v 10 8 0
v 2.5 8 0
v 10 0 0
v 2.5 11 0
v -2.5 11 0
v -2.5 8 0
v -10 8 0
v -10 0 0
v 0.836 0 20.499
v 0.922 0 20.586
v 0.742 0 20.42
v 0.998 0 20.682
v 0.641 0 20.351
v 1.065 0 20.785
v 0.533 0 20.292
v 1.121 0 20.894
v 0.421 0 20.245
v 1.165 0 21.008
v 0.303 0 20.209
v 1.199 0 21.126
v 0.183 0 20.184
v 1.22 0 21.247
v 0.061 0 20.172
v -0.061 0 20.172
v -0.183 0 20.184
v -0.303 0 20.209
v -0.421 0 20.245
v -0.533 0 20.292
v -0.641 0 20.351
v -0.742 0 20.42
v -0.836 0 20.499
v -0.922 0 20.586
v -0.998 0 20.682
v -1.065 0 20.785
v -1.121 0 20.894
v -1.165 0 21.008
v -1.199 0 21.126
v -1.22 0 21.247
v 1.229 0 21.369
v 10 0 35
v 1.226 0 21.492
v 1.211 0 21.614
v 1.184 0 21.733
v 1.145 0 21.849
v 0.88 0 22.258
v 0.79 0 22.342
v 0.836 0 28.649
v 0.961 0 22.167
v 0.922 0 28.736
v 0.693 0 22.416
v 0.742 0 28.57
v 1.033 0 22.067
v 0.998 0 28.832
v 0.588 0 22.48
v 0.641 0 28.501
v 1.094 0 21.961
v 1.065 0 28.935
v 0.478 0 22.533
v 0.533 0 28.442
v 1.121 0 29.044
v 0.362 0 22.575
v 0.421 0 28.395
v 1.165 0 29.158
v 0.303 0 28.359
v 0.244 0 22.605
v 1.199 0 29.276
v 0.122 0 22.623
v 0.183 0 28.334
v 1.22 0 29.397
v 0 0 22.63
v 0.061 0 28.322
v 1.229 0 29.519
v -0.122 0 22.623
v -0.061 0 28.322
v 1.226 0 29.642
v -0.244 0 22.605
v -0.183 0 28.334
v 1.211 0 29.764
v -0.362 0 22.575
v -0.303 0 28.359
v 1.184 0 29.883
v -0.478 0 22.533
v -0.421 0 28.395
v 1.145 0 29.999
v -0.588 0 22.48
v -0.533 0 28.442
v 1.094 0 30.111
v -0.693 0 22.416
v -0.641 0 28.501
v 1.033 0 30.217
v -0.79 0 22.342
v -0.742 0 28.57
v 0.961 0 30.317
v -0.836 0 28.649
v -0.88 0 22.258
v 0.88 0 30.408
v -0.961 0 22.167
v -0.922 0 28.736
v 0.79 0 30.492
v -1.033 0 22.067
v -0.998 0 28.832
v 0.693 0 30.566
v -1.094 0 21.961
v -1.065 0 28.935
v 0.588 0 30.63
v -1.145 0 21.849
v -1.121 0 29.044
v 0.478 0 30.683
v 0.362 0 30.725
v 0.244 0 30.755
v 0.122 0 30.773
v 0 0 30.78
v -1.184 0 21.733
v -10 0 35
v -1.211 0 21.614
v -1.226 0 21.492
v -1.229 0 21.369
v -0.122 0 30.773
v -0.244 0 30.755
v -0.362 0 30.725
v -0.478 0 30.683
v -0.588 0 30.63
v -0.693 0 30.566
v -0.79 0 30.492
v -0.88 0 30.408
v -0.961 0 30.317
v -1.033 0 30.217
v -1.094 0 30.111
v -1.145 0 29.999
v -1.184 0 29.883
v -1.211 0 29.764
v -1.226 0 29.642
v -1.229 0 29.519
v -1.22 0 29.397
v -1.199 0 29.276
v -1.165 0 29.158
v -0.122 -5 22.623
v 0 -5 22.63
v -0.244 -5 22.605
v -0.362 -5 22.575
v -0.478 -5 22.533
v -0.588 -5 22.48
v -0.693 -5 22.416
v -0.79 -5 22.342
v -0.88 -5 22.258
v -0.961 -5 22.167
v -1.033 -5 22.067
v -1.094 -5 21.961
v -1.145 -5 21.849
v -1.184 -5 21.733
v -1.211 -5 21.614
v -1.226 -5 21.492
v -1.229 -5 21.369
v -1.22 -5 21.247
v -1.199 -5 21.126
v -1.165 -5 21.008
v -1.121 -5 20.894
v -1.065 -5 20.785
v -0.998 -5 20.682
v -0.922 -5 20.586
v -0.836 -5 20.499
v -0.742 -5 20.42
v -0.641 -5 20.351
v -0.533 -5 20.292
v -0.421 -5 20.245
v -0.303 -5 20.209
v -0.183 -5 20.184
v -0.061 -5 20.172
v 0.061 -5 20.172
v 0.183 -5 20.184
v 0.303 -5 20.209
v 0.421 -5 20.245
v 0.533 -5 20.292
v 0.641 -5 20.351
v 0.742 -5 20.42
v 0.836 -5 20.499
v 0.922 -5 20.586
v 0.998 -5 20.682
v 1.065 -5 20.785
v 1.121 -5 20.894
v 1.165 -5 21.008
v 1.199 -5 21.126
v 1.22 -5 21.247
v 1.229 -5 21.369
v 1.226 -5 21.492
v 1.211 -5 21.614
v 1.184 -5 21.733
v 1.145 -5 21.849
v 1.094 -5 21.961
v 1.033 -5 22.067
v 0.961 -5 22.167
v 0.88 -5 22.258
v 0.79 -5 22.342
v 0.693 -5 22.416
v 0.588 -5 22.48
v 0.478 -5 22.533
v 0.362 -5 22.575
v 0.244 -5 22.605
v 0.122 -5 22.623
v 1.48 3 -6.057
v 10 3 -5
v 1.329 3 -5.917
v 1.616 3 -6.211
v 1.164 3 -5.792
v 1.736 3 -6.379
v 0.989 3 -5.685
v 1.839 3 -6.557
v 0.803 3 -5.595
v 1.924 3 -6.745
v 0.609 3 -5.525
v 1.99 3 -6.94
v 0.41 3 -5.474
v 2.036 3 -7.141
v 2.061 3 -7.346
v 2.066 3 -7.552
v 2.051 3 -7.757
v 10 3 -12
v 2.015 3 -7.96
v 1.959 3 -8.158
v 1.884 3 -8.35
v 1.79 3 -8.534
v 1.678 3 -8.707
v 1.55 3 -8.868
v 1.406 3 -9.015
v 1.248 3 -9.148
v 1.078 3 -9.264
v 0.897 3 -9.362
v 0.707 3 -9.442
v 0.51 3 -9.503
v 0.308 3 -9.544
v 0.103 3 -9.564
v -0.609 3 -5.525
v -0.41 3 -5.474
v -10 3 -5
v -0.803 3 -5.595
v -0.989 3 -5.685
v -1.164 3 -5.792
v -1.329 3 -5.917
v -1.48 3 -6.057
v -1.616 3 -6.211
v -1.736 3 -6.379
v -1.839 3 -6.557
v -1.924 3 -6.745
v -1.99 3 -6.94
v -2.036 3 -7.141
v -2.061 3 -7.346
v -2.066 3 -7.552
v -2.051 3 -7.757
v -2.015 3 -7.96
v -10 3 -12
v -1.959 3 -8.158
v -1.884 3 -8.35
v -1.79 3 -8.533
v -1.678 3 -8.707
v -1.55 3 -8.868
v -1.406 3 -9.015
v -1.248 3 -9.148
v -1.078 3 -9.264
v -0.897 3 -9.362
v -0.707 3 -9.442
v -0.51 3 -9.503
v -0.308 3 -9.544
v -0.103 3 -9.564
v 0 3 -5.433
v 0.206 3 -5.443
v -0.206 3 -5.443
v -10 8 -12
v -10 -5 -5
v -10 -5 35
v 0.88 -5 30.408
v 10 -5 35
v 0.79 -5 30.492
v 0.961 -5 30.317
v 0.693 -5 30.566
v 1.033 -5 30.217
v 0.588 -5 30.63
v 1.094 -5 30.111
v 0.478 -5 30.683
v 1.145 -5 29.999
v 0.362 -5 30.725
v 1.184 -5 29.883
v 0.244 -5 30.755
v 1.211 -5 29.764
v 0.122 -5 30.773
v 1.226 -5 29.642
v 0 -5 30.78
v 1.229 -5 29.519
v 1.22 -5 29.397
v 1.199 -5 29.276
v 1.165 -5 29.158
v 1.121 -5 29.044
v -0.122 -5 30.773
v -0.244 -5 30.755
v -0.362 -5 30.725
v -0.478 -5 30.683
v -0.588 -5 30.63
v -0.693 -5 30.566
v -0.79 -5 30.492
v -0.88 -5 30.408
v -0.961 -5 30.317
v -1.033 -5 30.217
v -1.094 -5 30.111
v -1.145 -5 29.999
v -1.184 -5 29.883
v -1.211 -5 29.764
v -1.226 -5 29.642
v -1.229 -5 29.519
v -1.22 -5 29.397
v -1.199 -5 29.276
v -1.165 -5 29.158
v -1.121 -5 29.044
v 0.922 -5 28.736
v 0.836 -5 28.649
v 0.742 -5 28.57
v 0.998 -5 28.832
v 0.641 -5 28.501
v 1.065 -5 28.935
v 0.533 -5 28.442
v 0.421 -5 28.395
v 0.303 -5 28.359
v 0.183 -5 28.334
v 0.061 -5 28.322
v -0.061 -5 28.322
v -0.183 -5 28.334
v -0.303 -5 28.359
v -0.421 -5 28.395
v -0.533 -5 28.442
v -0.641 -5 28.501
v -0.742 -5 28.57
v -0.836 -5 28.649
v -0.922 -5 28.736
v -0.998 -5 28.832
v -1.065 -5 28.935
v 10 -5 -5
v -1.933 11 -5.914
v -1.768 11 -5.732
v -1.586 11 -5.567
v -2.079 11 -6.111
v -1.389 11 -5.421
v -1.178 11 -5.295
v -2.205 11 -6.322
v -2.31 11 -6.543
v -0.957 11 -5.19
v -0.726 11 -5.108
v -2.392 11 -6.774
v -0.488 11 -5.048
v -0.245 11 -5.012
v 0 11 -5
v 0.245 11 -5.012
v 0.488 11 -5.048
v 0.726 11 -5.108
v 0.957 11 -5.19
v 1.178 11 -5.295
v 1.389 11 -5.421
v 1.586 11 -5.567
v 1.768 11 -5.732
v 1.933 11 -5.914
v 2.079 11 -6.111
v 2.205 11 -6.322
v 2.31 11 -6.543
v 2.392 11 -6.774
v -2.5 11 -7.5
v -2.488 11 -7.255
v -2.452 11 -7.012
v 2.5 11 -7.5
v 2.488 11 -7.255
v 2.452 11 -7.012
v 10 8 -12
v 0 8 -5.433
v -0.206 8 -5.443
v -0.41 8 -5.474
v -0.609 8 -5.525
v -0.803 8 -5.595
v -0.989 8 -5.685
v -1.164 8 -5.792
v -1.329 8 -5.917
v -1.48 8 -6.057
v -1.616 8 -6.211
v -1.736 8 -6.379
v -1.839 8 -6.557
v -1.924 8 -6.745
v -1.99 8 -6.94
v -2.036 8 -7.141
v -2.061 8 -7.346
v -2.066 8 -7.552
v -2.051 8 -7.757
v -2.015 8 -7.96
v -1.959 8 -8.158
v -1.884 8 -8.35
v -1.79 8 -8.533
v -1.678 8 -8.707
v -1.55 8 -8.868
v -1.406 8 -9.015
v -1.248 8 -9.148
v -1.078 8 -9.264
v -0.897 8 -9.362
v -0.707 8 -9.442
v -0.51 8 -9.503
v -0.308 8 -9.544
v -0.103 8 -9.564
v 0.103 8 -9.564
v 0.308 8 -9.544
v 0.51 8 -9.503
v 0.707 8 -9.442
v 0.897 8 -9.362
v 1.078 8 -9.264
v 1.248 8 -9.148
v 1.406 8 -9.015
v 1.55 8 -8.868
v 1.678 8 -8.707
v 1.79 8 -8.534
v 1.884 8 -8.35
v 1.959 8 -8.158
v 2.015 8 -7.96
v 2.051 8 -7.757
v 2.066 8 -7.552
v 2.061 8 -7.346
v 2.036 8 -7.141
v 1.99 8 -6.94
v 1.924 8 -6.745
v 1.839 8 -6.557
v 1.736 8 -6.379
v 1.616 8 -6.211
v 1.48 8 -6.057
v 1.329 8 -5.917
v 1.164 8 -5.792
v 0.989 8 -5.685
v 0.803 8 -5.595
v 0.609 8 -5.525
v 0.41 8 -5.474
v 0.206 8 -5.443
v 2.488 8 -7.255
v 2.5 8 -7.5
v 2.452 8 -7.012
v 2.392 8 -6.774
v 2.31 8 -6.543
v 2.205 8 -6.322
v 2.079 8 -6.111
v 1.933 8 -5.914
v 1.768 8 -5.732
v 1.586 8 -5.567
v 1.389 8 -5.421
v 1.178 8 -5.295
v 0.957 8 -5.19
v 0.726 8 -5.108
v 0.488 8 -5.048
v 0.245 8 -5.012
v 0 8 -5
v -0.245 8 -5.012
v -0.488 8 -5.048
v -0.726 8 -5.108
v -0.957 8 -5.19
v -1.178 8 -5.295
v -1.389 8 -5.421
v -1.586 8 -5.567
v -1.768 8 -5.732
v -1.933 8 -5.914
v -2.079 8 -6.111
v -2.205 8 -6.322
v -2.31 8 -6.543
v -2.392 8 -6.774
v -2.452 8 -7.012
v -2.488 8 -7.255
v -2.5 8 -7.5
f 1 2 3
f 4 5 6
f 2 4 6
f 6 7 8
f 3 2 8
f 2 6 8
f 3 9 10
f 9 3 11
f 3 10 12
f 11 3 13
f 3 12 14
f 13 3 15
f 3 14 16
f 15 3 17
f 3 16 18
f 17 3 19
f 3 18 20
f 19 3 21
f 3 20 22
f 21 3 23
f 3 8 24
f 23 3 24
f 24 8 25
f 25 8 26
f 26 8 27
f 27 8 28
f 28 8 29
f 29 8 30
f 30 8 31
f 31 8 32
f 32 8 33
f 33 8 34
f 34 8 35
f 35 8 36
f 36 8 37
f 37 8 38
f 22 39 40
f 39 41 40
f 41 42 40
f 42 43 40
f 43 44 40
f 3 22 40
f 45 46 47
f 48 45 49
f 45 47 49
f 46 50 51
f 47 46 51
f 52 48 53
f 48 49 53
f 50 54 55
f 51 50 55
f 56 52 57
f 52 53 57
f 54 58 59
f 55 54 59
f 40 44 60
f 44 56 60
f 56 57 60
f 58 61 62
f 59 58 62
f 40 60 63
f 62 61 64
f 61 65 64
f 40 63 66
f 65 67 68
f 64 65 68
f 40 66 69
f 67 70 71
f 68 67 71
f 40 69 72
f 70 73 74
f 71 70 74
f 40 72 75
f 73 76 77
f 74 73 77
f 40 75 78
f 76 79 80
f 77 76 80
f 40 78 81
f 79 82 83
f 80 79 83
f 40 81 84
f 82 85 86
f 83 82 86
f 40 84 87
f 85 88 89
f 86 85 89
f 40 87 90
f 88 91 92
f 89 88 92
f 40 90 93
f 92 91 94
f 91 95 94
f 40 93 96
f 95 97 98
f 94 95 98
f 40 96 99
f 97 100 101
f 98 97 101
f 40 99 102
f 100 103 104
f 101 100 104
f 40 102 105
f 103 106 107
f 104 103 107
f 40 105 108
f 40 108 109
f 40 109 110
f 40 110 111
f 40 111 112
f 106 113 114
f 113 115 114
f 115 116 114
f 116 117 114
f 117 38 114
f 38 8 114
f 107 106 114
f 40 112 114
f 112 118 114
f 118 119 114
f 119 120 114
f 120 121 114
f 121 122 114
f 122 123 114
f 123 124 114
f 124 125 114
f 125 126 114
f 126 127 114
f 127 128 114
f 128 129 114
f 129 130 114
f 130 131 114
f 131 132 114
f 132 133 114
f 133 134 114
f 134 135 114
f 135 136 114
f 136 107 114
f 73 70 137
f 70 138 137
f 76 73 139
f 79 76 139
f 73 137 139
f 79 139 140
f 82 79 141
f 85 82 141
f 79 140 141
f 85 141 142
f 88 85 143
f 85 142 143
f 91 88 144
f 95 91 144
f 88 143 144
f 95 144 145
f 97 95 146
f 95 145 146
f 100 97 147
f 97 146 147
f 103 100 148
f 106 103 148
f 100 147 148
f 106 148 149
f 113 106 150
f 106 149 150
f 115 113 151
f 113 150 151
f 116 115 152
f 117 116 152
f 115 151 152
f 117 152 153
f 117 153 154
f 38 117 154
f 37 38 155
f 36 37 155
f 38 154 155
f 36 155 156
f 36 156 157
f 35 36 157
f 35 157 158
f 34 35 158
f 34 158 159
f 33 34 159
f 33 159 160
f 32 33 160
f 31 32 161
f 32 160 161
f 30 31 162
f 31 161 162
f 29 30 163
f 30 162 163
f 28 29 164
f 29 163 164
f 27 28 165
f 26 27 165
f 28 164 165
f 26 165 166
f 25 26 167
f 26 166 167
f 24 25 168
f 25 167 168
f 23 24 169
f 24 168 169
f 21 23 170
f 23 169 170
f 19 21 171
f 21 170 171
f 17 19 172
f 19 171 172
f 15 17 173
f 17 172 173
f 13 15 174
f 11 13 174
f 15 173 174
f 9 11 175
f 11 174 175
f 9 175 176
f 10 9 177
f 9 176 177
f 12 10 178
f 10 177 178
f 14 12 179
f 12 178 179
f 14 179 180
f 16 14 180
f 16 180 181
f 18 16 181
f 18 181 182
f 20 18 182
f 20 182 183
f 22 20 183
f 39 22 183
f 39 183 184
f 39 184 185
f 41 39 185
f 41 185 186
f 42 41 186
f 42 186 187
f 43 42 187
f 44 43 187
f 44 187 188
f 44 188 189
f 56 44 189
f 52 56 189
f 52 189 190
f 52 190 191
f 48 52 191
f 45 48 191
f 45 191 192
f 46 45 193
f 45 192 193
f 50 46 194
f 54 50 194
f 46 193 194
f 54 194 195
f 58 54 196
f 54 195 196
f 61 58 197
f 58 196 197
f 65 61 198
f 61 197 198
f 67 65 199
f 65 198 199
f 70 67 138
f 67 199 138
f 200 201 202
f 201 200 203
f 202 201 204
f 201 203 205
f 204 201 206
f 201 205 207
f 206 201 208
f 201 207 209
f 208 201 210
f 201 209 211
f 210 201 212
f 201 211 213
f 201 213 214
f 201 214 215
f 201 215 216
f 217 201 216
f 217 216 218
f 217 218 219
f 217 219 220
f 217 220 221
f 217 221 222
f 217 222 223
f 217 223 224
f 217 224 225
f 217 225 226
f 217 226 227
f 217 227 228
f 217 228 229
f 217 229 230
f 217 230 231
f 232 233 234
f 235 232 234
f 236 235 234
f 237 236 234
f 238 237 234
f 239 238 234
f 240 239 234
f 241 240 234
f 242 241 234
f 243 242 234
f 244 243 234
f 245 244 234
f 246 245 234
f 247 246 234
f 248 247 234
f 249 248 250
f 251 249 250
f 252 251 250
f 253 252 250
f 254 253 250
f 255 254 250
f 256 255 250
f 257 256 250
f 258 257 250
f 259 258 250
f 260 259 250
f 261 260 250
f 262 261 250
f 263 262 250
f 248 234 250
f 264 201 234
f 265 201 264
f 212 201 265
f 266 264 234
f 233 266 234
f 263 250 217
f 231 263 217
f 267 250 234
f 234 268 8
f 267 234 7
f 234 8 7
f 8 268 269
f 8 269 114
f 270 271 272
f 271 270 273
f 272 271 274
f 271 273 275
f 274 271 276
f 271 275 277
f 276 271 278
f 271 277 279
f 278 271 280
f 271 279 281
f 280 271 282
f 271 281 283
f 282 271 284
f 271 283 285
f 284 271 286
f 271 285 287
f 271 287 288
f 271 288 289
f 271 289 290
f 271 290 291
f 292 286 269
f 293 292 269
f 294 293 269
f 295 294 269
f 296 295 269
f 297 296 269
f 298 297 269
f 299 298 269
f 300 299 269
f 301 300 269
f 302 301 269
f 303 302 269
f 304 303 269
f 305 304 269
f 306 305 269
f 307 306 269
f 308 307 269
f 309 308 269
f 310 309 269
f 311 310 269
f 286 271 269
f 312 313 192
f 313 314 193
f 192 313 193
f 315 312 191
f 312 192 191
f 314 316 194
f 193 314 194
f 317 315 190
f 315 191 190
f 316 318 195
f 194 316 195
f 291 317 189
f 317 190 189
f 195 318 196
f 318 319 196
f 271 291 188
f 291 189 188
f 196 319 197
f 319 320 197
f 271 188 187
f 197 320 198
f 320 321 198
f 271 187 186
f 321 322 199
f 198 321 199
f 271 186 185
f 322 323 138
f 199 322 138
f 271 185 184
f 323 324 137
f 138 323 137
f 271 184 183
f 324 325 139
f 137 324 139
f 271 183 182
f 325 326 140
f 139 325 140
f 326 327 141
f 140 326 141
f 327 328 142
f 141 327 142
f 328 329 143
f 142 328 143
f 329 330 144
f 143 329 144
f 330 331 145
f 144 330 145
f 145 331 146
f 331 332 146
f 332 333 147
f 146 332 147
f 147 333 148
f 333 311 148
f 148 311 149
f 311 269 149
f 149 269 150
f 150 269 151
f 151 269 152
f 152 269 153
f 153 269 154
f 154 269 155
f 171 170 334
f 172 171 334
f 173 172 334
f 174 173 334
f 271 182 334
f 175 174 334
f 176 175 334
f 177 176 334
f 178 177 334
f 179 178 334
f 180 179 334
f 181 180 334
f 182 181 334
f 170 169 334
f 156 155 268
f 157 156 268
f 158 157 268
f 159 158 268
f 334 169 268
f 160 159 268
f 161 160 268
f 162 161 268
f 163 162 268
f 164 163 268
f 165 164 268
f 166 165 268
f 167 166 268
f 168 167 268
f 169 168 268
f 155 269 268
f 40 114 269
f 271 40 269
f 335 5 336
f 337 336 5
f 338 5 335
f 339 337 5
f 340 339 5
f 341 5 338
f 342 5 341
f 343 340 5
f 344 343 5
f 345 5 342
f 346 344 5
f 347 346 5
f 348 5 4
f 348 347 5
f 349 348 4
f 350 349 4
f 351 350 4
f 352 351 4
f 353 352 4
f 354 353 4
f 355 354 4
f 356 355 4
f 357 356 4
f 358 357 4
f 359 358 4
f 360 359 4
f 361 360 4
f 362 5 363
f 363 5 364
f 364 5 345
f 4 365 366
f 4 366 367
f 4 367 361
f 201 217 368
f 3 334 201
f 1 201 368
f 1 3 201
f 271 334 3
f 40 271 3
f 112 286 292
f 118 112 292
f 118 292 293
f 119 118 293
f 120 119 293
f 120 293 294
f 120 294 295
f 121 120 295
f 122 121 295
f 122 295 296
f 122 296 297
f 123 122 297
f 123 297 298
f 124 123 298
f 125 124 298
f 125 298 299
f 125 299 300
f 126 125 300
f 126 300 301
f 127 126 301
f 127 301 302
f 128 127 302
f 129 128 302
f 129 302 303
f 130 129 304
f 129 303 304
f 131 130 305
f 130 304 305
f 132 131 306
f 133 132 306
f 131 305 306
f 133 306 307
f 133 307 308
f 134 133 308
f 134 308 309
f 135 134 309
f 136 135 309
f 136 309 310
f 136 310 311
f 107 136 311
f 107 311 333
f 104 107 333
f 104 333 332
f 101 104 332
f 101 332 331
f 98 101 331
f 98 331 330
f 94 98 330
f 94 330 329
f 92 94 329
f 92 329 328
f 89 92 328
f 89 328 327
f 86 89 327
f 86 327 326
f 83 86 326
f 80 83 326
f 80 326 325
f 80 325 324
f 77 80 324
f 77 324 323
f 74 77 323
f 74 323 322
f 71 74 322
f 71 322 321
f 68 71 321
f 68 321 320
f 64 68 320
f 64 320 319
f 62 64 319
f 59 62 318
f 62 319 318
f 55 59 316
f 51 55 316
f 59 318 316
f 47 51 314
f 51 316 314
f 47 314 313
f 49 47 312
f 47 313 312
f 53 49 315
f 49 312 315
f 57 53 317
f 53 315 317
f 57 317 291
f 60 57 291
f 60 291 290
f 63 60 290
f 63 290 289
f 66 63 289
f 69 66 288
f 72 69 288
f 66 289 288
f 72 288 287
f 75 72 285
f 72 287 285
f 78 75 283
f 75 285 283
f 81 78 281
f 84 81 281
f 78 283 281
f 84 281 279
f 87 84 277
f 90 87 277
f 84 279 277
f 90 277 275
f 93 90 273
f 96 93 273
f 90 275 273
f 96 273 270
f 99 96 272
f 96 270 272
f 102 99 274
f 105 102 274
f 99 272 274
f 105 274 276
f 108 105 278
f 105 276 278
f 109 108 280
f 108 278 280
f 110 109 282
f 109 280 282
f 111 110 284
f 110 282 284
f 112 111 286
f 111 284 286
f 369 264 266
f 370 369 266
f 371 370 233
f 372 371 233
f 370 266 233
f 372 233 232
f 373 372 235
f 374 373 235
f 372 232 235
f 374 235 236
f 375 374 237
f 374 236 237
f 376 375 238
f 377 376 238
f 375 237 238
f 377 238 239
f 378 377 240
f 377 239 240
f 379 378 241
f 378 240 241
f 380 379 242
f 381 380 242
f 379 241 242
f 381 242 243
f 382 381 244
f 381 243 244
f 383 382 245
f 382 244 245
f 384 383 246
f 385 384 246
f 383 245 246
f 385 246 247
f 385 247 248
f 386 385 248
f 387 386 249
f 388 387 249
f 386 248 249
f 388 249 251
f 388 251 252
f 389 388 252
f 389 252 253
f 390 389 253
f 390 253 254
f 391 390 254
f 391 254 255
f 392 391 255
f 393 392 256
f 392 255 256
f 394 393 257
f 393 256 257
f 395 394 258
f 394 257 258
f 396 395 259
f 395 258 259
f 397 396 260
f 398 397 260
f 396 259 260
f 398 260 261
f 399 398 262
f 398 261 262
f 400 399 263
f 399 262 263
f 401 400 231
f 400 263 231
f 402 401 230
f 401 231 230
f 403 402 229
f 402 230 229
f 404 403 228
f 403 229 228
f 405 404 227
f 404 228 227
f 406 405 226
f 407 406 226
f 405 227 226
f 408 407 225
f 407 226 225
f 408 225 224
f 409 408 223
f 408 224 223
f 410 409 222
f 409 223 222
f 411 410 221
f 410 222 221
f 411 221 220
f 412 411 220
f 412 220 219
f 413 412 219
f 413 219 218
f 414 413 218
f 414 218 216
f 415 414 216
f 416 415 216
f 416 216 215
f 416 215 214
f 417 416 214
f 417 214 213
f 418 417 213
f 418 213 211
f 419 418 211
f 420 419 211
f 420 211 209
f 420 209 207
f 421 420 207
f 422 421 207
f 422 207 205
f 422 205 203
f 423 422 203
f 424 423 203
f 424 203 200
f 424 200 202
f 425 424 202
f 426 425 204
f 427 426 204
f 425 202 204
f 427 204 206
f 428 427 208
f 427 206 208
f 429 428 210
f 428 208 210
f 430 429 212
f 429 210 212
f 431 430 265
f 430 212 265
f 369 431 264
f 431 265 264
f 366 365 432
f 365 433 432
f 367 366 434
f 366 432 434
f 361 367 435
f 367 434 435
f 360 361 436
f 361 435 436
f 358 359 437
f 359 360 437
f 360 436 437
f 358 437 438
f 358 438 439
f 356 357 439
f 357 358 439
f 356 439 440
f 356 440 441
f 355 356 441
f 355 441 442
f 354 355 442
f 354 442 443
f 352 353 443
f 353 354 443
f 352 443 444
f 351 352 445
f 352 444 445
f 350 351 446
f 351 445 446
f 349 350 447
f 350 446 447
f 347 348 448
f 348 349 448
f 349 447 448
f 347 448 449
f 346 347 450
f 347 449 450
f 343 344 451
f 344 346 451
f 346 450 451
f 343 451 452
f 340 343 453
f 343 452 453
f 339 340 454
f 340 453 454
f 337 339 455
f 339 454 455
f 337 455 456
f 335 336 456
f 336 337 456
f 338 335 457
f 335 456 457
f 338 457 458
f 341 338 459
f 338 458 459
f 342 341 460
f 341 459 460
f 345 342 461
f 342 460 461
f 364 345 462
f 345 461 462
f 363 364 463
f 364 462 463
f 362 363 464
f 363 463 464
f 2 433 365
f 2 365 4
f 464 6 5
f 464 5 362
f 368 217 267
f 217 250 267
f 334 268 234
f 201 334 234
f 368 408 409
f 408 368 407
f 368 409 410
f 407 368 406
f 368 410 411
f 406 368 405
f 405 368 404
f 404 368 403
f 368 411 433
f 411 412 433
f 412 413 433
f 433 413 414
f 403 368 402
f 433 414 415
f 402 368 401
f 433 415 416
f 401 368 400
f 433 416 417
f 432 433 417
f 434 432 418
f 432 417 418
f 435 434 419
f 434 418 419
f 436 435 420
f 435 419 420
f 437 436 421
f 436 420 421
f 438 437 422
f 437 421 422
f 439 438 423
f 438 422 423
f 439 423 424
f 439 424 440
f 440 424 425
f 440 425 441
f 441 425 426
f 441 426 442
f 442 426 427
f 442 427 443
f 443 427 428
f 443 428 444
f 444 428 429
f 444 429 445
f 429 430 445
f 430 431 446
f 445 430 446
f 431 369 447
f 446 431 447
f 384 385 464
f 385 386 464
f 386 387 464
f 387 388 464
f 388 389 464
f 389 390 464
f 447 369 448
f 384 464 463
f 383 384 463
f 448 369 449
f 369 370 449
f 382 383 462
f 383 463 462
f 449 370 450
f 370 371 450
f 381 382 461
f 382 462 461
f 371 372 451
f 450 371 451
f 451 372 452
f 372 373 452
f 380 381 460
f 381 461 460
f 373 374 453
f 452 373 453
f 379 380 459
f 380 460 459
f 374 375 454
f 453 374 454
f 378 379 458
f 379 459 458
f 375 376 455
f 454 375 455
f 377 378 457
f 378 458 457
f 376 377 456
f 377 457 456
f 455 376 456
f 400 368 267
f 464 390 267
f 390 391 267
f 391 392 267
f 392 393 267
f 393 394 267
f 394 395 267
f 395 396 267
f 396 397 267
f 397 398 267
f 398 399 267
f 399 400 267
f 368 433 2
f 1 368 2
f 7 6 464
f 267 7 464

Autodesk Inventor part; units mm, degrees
ref_plane "YZ Plane" through (0, 0, 0) normal (1, 0, 0) x (0, 1, 0)
ref_plane "XZ Plane" through (0, 0, 0) normal (0, 1, 0) x (-1, 0, 0)
ref_plane "XY Plane" through (0, 0, 0) normal (0, 0, 1) x (1, 0, 0)
sketch "Skizze1" plane through (0, 0, 0) normal (1, 0, 0) x (0, 1, 0)
  line L0 (8, 0) -> (0, 0)
  line L1 (0, 0) -> (0, 35)
  line L2 (0, 35) -> (-5, 35)
  line L3 (-5, 35) -> (-5, -5)
  line L4 (-5, -5) -> (3, -5)
  line L5 (3, -5) -> (3, -12)
  line L6 (3, -12) -> (8, -12)
  line L7 (8, -12) -> (8, 0)
  dimension "d0" = 5
  dimension "d1" = 35
  dimension "d2" = 5
  dimension "d3" = 5
  dimension "d4" = 12
  dimension "d5" = 8
extrude "Extrusion1" add sketch "Skizze1" along normal mid plane 20
sketch "Skizze2" plane through (-10, 8, 0) normal (0, 1, 0) x (1, 0, 0)
  line L0 (20, 0) -> (0, 0) projected
  line L1 (12.5, 0) -> (7.5, 0)
  line L2 (7.5, 0) -> (7.5, 7.5)
  line L3 (7.5, 7.5) -> (12.5, 7.5)
  line L4 (12.5, 7.5) -> (12.5, 0)
  circle A0 centre (10, 7.5) radius 2.5
  point P0 (10, 0)
  point P1 (10, 0)
  dimension "d8" = 5
  dimension "d9" = 7.5
  dimension "d10" = 5
extrude "Extrusion2" add sketch "Skizze2" along normal blind 3 contours L0 L2 A0 L4
sketch "Skizze3" plane through (-10, 8, -12) normal (0, 1, 0) x (1, 0, 0)
  arc A0 (7.5, -4.5) -> (12.5, -4.5) centre (10, -4.5) ccw projected
  point P0 (10, -12)
hole "Bohrung1" at (0, 8, -7.5) direction (0, -1, 0) diameter 4.134 end through all thread size "M5x0.8" class "6H" standard "ISO Metric profile"
sketch "Skizze4" plane through (-10, 0, 35) normal (0, 1, 0) x (1, 0, 0)
  line L0 (10, 35) -> (10, 0) construction
  line L1 (0, 0) -> (20, 0) projected
  line L2 (20, 35) -> (0, 35) projected
  point P0 (10, 5.45)
  point P1 (10, 13.6)
  dimension "d20" = 21.4
  dimension "d21" = 29.55
hole "Bohrung2" at (0, 0, 29.55) at (0, 0, 21.4) direction (0, -1, 0) diameter 2.459 end through all thread size "M3x0.5" class "6H" standard "ISO Metric profile"
properties part number "Nozzle_Brush_Holder_slim"
